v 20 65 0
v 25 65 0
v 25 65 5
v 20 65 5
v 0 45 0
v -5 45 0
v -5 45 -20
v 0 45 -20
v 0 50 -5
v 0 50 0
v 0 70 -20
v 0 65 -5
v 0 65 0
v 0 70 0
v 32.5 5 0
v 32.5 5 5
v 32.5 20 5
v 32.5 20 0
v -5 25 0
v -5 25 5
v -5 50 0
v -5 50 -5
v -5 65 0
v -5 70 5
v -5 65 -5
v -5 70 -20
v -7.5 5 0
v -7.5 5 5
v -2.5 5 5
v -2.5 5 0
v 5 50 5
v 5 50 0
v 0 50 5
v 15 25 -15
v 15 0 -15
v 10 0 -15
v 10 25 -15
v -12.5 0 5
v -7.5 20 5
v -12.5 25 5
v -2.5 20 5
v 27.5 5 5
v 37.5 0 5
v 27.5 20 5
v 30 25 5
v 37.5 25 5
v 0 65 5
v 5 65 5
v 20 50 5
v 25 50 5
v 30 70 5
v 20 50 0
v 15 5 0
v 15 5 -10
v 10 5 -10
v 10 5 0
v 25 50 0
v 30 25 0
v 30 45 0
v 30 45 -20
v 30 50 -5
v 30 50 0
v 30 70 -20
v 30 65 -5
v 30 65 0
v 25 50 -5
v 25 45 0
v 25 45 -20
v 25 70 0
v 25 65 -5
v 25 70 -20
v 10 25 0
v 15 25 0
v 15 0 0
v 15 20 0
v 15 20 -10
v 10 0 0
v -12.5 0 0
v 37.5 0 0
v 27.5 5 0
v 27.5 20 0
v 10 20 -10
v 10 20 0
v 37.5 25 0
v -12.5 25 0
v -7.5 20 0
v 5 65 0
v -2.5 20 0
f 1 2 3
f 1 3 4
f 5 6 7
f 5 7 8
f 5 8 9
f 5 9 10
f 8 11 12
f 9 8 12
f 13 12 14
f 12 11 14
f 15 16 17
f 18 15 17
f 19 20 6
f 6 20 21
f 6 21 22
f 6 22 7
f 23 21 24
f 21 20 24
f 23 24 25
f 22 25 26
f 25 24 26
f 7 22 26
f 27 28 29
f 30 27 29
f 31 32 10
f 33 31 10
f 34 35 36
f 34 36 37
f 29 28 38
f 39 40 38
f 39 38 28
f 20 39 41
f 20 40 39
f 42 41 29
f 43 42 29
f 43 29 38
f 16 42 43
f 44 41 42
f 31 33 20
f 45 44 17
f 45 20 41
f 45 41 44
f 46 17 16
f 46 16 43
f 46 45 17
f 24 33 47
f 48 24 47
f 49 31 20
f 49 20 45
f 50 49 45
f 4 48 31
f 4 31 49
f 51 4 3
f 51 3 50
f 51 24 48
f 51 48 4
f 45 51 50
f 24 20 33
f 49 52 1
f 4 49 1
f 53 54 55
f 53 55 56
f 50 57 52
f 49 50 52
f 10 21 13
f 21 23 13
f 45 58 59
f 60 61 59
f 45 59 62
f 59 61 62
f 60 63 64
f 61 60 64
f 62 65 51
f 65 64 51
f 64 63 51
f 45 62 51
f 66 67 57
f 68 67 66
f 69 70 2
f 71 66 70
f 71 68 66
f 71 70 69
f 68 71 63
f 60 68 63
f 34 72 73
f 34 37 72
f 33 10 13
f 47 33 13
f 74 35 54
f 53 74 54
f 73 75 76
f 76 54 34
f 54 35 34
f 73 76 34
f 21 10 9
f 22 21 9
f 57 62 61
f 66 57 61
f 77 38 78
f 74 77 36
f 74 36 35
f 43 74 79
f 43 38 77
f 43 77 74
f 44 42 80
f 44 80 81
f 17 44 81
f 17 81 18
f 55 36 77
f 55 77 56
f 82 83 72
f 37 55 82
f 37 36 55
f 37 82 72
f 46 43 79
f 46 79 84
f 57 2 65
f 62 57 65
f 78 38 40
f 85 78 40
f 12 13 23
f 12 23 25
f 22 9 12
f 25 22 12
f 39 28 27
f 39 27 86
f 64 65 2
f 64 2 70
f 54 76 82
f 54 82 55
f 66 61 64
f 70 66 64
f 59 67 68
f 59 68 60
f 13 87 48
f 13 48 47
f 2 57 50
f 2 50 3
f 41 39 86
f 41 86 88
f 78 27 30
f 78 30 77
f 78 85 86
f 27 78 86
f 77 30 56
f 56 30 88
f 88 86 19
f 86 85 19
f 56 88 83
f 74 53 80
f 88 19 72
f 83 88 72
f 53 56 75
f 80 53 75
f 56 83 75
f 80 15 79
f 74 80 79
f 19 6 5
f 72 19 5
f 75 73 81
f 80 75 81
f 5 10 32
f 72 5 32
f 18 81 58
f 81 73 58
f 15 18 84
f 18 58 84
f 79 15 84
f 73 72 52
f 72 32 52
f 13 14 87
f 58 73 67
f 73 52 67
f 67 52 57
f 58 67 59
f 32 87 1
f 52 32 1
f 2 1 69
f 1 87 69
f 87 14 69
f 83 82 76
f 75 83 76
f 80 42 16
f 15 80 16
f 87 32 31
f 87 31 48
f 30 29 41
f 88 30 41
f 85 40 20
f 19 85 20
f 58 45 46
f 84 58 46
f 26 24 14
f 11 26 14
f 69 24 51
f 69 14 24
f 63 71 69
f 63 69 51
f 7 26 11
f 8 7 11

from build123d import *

# Parameters (mm, degrees)
BOSS_EXTRUDE1_DEPTH = 2
SKETCH2_W           = 5
SKETCH2_H           = 25
SKETCH2_W_2         = 20
BOSS_EXTRUDE2_DEPTH = 20
SKETCH3_W           = 25
SKETCH3_H           = 2
BOSS_EXTRUDE3_DEPTH = 25
SKETCH4_W           = 25
SKETCH4_H           = 25
BOSS_EXTRUDE4_DEPTH = 7
BOSS_EXTRUDE5_DEPTH = 5
SKETCH6_W           = 50
SKETCH6_H           = 25
BOSS_EXTRUDE6_DEPTH = 5
BOSS_EXTRUDE7_DEPTH = 30
CUT_EXTRUDE2_DEPTH  = 30
SKETCH10_W          = 5
SKETCH10_H          = 25
CUT_EXTRUDE3_DEPTH  = 20
SKETCH11_W          = 25
SKETCH11_H          = 25
CUT_EXTRUDE4_DEPTH  = 7
SKETCH13_W          = 5
SKETCH13_H          = 25
CUT_EXTRUDE5_DEPTH  = 10
BOSS_EXTRUDE8_REACH = 12
SKETCH14_W          = 10
SKETCH14_H          = 5
SKETCH15_W          = 2.5
SKETCH15_H          = 25
CUT_EXTRUDE6_DEPTH  = 15
SKETCH16_W          = 5
SKETCH16_H          = 15
CUT_EXTRUDE7_DEPTH  = 26
SKETCH17_W          = 5
SKETCH17_H          = 15
CUT_EXTRUDE8_DEPTH  = 43.5
SKETCH18_W          = 5
SKETCH18_H          = 15
CUT_EXTRUDE9_DEPTH  = 6


with BuildPart() as part:
    # Sketch1 → Boss-Extrude1 (new body)
    with BuildSketch(Plane.XY):
        Polygon((-5, 75), (2.5, 25), (2.5, 0), (22.5, 0), (22.5, 25), (30, 75), (30, 100), (25, 100), (25, 75), (0, 75), (0, 100), (-5, 100), align=None)
    extrude(amount=BOSS_EXTRUDE1_DEPTH)

    # Sketch2 → Boss-Extrude2 (add)
    with BuildSketch(Plane(origin=(0, 0, 0), x_dir=(-1, 0, 0), z_dir=(0, 0, -1))):
        with Locations((-27.5, 87.5)):
            Rectangle(SKETCH2_W, SKETCH2_H)
        with Locations((2.5, 87.5)):
            Rectangle(SKETCH2_W, SKETCH2_H)
        with Locations((-12.5, 12.5)):
            Rectangle(SKETCH2_W_2, SKETCH2_H)
    extrude(amount=BOSS_EXTRUDE2_DEPTH)

    # Sketch3 → Boss-Extrude3 (add)
    with BuildSketch(Plane(origin=(0, 75, 0), x_dir=(1, 0, 0), z_dir=(0, 1, 0))):
        with Locations((12.5, -1)):
            Rectangle(SKETCH3_W, SKETCH3_H)
    extrude(amount=BOSS_EXTRUDE3_DEPTH)

    # Sketch4 → Boss-Extrude4 (add)
    with BuildSketch(Plane(origin=(0, 0, 0), x_dir=(-1, 0, 0), z_dir=(0, 0, -1))):
        with Locations((-12.5, 87.5)):
            Rectangle(SKETCH4_W, SKETCH4_H)
    extrude(amount=BOSS_EXTRUDE4_DEPTH)

    # Sketch5 → Boss-Extrude5 (add)
    with BuildSketch(Plane(origin=(0, 0, 0), x_dir=(-1, 0, 0), z_dir=(0, 0, -1))):
        Polygon((5, 75), (5, 0), (-2.5, 0), (-22.5, 0), (-30, 0), (-30, 75), (-30, 100), (5, 100), align=None)
    extrude(amount=-BOSS_EXTRUDE5_DEPTH)

    # Sketch6 → Boss-Extrude6 (add)
    with BuildSketch(Plane.XY.offset(5)):
        with Locations((12.5, 12.5)):
            Rectangle(SKETCH6_W, SKETCH6_H)
    extrude(amount=-BOSS_EXTRUDE6_DEPTH)

    # Sketch8 → Boss-Extrude7 (add)
    with BuildSketch(Plane.XZ.offset(-75)):
        Polygon((-5, 0), (-5, -20), (0, -20), (0, -7), (25, -7), (25, -20), (30, -20), (30, 0), align=None)
    extrude(amount=BOSS_EXTRUDE7_DEPTH)

    # Sketch9 → Cut-Extrude2 (cut)
    with BuildSketch(Plane(origin=(0, 100, 0), x_dir=(1, 0, 0), z_dir=(0, 1, 0))):
        Polygon((30, 20), (25, 20), (25, 7), (0, 7), (0, 20), (-5, 20), (-5, -5), (30, -5), align=None)
    extrude(amount=-CUT_EXTRUDE2_DEPTH, mode=Mode.SUBTRACT)

    # Sketch10 → Cut-Extrude3 (cut)
    with BuildSketch(Plane(origin=(0, 0, -20), x_dir=(-1, 0, 0), z_dir=(0, 0, -1))):
        with Locations((-20, 12.5)):
            Rectangle(SKETCH10_W, SKETCH10_H)
        with Locations((-5, 12.5)):
            Rectangle(SKETCH10_W, SKETCH10_H)
    extrude(amount=-CUT_EXTRUDE3_DEPTH, mode=Mode.SUBTRACT)

    # Sketch11 → Cut-Extrude4 (cut)
    with BuildSketch(Plane(origin=(0, 0, -7), x_dir=(-1, 0, 0), z_dir=(0, 0, -1))):
        with Locations((-12.5, 57.5)):
            Rectangle(SKETCH11_W, SKETCH11_H)
    extrude(amount=-CUT_EXTRUDE4_DEPTH, mode=Mode.SUBTRACT)

    # Sketch13 → Cut-Extrude5 (cut)
    with BuildSketch(Plane(origin=(17.5, 0, 0), x_dir=(0, 0, -1), z_dir=(1, 0, 0))):
        Polygon((5, 25), (5, 20), (10, 20), (10, 5), (0, 5), (0, 25), align=None)
        with Locations((17.5, 12.5)):
            Rectangle(SKETCH13_W, SKETCH13_H)
    extrude(amount=-CUT_EXTRUDE5_DEPTH, mode=Mode.SUBTRACT)

    # Sketch14 → Boss-Extrude8 (add, up to next)
    with BuildSketch(Plane.XY.offset(-5), mode=Mode.PRIVATE) as boss_extrude8_sk1:
        with Locations((12.5, 22.5)):
            Rectangle(SKETCH14_W, SKETCH14_H)
    boss_extrude8_tool1 = extrude(boss_extrude8_sk1.sketch, amount=BOSS_EXTRUDE8_REACH, mode=Mode.PRIVATE) - part.part
    add(boss_extrude8_tool1.solids().sort_by_distance((12.5, 22.5, -5))[0])

    # Sketch15 → Cut-Extrude6 (cut)
    with BuildSketch(Plane(origin=(0, 0, -15), x_dir=(-1, 0, 0), z_dir=(0, 0, -1))):
        with Locations((-8.75, 12.5)):
            Rectangle(SKETCH15_W, SKETCH15_H)
        with Locations((-16.25, 12.5)):
            Rectangle(SKETCH15_W, SKETCH15_H)
    extrude(amount=-CUT_EXTRUDE6_DEPTH, mode=Mode.SUBTRACT)

    # Sketch16 → Cut-Extrude7 (cut, through all)
    with BuildSketch(Plane.XY.offset(5)):
        with Locations((-5, 12.5)):
            Rectangle(SKETCH16_W, SKETCH16_H)
        with Locations((30, 12.5)):
            Rectangle(SKETCH16_W, SKETCH16_H)
    extrude(amount=-CUT_EXTRUDE7_DEPTH, mode=Mode.SUBTRACT)

    # Sketch17 → Cut-Extrude8 (cut, through all)
    with BuildSketch(Plane(origin=(30, 0, 0), x_dir=(0, 0, -1), z_dir=(1, 0, 0))):
        with Locations((2.5, 57.5)):
            Rectangle(SKETCH17_W, SKETCH17_H)
    extrude(amount=-CUT_EXTRUDE8_DEPTH, mode=Mode.SUBTRACT)

    # Sketch18 → Cut-Extrude9 (cut, through all)
    with BuildSketch(Plane(origin=(0, 0, 0), x_dir=(-1, 0, 0), z_dir=(0, 0, -1))):
        with Locations((-2.5, 57.5)):
            Rectangle(SKETCH18_W, SKETCH18_H)
        with Locations((-22.5, 57.5)):
            Rectangle(SKETCH18_W, SKETCH18_H)
    extrude(amount=-CUT_EXTRUDE9_DEPTH, mode=Mode.SUBTRACT)


solid = part.part
